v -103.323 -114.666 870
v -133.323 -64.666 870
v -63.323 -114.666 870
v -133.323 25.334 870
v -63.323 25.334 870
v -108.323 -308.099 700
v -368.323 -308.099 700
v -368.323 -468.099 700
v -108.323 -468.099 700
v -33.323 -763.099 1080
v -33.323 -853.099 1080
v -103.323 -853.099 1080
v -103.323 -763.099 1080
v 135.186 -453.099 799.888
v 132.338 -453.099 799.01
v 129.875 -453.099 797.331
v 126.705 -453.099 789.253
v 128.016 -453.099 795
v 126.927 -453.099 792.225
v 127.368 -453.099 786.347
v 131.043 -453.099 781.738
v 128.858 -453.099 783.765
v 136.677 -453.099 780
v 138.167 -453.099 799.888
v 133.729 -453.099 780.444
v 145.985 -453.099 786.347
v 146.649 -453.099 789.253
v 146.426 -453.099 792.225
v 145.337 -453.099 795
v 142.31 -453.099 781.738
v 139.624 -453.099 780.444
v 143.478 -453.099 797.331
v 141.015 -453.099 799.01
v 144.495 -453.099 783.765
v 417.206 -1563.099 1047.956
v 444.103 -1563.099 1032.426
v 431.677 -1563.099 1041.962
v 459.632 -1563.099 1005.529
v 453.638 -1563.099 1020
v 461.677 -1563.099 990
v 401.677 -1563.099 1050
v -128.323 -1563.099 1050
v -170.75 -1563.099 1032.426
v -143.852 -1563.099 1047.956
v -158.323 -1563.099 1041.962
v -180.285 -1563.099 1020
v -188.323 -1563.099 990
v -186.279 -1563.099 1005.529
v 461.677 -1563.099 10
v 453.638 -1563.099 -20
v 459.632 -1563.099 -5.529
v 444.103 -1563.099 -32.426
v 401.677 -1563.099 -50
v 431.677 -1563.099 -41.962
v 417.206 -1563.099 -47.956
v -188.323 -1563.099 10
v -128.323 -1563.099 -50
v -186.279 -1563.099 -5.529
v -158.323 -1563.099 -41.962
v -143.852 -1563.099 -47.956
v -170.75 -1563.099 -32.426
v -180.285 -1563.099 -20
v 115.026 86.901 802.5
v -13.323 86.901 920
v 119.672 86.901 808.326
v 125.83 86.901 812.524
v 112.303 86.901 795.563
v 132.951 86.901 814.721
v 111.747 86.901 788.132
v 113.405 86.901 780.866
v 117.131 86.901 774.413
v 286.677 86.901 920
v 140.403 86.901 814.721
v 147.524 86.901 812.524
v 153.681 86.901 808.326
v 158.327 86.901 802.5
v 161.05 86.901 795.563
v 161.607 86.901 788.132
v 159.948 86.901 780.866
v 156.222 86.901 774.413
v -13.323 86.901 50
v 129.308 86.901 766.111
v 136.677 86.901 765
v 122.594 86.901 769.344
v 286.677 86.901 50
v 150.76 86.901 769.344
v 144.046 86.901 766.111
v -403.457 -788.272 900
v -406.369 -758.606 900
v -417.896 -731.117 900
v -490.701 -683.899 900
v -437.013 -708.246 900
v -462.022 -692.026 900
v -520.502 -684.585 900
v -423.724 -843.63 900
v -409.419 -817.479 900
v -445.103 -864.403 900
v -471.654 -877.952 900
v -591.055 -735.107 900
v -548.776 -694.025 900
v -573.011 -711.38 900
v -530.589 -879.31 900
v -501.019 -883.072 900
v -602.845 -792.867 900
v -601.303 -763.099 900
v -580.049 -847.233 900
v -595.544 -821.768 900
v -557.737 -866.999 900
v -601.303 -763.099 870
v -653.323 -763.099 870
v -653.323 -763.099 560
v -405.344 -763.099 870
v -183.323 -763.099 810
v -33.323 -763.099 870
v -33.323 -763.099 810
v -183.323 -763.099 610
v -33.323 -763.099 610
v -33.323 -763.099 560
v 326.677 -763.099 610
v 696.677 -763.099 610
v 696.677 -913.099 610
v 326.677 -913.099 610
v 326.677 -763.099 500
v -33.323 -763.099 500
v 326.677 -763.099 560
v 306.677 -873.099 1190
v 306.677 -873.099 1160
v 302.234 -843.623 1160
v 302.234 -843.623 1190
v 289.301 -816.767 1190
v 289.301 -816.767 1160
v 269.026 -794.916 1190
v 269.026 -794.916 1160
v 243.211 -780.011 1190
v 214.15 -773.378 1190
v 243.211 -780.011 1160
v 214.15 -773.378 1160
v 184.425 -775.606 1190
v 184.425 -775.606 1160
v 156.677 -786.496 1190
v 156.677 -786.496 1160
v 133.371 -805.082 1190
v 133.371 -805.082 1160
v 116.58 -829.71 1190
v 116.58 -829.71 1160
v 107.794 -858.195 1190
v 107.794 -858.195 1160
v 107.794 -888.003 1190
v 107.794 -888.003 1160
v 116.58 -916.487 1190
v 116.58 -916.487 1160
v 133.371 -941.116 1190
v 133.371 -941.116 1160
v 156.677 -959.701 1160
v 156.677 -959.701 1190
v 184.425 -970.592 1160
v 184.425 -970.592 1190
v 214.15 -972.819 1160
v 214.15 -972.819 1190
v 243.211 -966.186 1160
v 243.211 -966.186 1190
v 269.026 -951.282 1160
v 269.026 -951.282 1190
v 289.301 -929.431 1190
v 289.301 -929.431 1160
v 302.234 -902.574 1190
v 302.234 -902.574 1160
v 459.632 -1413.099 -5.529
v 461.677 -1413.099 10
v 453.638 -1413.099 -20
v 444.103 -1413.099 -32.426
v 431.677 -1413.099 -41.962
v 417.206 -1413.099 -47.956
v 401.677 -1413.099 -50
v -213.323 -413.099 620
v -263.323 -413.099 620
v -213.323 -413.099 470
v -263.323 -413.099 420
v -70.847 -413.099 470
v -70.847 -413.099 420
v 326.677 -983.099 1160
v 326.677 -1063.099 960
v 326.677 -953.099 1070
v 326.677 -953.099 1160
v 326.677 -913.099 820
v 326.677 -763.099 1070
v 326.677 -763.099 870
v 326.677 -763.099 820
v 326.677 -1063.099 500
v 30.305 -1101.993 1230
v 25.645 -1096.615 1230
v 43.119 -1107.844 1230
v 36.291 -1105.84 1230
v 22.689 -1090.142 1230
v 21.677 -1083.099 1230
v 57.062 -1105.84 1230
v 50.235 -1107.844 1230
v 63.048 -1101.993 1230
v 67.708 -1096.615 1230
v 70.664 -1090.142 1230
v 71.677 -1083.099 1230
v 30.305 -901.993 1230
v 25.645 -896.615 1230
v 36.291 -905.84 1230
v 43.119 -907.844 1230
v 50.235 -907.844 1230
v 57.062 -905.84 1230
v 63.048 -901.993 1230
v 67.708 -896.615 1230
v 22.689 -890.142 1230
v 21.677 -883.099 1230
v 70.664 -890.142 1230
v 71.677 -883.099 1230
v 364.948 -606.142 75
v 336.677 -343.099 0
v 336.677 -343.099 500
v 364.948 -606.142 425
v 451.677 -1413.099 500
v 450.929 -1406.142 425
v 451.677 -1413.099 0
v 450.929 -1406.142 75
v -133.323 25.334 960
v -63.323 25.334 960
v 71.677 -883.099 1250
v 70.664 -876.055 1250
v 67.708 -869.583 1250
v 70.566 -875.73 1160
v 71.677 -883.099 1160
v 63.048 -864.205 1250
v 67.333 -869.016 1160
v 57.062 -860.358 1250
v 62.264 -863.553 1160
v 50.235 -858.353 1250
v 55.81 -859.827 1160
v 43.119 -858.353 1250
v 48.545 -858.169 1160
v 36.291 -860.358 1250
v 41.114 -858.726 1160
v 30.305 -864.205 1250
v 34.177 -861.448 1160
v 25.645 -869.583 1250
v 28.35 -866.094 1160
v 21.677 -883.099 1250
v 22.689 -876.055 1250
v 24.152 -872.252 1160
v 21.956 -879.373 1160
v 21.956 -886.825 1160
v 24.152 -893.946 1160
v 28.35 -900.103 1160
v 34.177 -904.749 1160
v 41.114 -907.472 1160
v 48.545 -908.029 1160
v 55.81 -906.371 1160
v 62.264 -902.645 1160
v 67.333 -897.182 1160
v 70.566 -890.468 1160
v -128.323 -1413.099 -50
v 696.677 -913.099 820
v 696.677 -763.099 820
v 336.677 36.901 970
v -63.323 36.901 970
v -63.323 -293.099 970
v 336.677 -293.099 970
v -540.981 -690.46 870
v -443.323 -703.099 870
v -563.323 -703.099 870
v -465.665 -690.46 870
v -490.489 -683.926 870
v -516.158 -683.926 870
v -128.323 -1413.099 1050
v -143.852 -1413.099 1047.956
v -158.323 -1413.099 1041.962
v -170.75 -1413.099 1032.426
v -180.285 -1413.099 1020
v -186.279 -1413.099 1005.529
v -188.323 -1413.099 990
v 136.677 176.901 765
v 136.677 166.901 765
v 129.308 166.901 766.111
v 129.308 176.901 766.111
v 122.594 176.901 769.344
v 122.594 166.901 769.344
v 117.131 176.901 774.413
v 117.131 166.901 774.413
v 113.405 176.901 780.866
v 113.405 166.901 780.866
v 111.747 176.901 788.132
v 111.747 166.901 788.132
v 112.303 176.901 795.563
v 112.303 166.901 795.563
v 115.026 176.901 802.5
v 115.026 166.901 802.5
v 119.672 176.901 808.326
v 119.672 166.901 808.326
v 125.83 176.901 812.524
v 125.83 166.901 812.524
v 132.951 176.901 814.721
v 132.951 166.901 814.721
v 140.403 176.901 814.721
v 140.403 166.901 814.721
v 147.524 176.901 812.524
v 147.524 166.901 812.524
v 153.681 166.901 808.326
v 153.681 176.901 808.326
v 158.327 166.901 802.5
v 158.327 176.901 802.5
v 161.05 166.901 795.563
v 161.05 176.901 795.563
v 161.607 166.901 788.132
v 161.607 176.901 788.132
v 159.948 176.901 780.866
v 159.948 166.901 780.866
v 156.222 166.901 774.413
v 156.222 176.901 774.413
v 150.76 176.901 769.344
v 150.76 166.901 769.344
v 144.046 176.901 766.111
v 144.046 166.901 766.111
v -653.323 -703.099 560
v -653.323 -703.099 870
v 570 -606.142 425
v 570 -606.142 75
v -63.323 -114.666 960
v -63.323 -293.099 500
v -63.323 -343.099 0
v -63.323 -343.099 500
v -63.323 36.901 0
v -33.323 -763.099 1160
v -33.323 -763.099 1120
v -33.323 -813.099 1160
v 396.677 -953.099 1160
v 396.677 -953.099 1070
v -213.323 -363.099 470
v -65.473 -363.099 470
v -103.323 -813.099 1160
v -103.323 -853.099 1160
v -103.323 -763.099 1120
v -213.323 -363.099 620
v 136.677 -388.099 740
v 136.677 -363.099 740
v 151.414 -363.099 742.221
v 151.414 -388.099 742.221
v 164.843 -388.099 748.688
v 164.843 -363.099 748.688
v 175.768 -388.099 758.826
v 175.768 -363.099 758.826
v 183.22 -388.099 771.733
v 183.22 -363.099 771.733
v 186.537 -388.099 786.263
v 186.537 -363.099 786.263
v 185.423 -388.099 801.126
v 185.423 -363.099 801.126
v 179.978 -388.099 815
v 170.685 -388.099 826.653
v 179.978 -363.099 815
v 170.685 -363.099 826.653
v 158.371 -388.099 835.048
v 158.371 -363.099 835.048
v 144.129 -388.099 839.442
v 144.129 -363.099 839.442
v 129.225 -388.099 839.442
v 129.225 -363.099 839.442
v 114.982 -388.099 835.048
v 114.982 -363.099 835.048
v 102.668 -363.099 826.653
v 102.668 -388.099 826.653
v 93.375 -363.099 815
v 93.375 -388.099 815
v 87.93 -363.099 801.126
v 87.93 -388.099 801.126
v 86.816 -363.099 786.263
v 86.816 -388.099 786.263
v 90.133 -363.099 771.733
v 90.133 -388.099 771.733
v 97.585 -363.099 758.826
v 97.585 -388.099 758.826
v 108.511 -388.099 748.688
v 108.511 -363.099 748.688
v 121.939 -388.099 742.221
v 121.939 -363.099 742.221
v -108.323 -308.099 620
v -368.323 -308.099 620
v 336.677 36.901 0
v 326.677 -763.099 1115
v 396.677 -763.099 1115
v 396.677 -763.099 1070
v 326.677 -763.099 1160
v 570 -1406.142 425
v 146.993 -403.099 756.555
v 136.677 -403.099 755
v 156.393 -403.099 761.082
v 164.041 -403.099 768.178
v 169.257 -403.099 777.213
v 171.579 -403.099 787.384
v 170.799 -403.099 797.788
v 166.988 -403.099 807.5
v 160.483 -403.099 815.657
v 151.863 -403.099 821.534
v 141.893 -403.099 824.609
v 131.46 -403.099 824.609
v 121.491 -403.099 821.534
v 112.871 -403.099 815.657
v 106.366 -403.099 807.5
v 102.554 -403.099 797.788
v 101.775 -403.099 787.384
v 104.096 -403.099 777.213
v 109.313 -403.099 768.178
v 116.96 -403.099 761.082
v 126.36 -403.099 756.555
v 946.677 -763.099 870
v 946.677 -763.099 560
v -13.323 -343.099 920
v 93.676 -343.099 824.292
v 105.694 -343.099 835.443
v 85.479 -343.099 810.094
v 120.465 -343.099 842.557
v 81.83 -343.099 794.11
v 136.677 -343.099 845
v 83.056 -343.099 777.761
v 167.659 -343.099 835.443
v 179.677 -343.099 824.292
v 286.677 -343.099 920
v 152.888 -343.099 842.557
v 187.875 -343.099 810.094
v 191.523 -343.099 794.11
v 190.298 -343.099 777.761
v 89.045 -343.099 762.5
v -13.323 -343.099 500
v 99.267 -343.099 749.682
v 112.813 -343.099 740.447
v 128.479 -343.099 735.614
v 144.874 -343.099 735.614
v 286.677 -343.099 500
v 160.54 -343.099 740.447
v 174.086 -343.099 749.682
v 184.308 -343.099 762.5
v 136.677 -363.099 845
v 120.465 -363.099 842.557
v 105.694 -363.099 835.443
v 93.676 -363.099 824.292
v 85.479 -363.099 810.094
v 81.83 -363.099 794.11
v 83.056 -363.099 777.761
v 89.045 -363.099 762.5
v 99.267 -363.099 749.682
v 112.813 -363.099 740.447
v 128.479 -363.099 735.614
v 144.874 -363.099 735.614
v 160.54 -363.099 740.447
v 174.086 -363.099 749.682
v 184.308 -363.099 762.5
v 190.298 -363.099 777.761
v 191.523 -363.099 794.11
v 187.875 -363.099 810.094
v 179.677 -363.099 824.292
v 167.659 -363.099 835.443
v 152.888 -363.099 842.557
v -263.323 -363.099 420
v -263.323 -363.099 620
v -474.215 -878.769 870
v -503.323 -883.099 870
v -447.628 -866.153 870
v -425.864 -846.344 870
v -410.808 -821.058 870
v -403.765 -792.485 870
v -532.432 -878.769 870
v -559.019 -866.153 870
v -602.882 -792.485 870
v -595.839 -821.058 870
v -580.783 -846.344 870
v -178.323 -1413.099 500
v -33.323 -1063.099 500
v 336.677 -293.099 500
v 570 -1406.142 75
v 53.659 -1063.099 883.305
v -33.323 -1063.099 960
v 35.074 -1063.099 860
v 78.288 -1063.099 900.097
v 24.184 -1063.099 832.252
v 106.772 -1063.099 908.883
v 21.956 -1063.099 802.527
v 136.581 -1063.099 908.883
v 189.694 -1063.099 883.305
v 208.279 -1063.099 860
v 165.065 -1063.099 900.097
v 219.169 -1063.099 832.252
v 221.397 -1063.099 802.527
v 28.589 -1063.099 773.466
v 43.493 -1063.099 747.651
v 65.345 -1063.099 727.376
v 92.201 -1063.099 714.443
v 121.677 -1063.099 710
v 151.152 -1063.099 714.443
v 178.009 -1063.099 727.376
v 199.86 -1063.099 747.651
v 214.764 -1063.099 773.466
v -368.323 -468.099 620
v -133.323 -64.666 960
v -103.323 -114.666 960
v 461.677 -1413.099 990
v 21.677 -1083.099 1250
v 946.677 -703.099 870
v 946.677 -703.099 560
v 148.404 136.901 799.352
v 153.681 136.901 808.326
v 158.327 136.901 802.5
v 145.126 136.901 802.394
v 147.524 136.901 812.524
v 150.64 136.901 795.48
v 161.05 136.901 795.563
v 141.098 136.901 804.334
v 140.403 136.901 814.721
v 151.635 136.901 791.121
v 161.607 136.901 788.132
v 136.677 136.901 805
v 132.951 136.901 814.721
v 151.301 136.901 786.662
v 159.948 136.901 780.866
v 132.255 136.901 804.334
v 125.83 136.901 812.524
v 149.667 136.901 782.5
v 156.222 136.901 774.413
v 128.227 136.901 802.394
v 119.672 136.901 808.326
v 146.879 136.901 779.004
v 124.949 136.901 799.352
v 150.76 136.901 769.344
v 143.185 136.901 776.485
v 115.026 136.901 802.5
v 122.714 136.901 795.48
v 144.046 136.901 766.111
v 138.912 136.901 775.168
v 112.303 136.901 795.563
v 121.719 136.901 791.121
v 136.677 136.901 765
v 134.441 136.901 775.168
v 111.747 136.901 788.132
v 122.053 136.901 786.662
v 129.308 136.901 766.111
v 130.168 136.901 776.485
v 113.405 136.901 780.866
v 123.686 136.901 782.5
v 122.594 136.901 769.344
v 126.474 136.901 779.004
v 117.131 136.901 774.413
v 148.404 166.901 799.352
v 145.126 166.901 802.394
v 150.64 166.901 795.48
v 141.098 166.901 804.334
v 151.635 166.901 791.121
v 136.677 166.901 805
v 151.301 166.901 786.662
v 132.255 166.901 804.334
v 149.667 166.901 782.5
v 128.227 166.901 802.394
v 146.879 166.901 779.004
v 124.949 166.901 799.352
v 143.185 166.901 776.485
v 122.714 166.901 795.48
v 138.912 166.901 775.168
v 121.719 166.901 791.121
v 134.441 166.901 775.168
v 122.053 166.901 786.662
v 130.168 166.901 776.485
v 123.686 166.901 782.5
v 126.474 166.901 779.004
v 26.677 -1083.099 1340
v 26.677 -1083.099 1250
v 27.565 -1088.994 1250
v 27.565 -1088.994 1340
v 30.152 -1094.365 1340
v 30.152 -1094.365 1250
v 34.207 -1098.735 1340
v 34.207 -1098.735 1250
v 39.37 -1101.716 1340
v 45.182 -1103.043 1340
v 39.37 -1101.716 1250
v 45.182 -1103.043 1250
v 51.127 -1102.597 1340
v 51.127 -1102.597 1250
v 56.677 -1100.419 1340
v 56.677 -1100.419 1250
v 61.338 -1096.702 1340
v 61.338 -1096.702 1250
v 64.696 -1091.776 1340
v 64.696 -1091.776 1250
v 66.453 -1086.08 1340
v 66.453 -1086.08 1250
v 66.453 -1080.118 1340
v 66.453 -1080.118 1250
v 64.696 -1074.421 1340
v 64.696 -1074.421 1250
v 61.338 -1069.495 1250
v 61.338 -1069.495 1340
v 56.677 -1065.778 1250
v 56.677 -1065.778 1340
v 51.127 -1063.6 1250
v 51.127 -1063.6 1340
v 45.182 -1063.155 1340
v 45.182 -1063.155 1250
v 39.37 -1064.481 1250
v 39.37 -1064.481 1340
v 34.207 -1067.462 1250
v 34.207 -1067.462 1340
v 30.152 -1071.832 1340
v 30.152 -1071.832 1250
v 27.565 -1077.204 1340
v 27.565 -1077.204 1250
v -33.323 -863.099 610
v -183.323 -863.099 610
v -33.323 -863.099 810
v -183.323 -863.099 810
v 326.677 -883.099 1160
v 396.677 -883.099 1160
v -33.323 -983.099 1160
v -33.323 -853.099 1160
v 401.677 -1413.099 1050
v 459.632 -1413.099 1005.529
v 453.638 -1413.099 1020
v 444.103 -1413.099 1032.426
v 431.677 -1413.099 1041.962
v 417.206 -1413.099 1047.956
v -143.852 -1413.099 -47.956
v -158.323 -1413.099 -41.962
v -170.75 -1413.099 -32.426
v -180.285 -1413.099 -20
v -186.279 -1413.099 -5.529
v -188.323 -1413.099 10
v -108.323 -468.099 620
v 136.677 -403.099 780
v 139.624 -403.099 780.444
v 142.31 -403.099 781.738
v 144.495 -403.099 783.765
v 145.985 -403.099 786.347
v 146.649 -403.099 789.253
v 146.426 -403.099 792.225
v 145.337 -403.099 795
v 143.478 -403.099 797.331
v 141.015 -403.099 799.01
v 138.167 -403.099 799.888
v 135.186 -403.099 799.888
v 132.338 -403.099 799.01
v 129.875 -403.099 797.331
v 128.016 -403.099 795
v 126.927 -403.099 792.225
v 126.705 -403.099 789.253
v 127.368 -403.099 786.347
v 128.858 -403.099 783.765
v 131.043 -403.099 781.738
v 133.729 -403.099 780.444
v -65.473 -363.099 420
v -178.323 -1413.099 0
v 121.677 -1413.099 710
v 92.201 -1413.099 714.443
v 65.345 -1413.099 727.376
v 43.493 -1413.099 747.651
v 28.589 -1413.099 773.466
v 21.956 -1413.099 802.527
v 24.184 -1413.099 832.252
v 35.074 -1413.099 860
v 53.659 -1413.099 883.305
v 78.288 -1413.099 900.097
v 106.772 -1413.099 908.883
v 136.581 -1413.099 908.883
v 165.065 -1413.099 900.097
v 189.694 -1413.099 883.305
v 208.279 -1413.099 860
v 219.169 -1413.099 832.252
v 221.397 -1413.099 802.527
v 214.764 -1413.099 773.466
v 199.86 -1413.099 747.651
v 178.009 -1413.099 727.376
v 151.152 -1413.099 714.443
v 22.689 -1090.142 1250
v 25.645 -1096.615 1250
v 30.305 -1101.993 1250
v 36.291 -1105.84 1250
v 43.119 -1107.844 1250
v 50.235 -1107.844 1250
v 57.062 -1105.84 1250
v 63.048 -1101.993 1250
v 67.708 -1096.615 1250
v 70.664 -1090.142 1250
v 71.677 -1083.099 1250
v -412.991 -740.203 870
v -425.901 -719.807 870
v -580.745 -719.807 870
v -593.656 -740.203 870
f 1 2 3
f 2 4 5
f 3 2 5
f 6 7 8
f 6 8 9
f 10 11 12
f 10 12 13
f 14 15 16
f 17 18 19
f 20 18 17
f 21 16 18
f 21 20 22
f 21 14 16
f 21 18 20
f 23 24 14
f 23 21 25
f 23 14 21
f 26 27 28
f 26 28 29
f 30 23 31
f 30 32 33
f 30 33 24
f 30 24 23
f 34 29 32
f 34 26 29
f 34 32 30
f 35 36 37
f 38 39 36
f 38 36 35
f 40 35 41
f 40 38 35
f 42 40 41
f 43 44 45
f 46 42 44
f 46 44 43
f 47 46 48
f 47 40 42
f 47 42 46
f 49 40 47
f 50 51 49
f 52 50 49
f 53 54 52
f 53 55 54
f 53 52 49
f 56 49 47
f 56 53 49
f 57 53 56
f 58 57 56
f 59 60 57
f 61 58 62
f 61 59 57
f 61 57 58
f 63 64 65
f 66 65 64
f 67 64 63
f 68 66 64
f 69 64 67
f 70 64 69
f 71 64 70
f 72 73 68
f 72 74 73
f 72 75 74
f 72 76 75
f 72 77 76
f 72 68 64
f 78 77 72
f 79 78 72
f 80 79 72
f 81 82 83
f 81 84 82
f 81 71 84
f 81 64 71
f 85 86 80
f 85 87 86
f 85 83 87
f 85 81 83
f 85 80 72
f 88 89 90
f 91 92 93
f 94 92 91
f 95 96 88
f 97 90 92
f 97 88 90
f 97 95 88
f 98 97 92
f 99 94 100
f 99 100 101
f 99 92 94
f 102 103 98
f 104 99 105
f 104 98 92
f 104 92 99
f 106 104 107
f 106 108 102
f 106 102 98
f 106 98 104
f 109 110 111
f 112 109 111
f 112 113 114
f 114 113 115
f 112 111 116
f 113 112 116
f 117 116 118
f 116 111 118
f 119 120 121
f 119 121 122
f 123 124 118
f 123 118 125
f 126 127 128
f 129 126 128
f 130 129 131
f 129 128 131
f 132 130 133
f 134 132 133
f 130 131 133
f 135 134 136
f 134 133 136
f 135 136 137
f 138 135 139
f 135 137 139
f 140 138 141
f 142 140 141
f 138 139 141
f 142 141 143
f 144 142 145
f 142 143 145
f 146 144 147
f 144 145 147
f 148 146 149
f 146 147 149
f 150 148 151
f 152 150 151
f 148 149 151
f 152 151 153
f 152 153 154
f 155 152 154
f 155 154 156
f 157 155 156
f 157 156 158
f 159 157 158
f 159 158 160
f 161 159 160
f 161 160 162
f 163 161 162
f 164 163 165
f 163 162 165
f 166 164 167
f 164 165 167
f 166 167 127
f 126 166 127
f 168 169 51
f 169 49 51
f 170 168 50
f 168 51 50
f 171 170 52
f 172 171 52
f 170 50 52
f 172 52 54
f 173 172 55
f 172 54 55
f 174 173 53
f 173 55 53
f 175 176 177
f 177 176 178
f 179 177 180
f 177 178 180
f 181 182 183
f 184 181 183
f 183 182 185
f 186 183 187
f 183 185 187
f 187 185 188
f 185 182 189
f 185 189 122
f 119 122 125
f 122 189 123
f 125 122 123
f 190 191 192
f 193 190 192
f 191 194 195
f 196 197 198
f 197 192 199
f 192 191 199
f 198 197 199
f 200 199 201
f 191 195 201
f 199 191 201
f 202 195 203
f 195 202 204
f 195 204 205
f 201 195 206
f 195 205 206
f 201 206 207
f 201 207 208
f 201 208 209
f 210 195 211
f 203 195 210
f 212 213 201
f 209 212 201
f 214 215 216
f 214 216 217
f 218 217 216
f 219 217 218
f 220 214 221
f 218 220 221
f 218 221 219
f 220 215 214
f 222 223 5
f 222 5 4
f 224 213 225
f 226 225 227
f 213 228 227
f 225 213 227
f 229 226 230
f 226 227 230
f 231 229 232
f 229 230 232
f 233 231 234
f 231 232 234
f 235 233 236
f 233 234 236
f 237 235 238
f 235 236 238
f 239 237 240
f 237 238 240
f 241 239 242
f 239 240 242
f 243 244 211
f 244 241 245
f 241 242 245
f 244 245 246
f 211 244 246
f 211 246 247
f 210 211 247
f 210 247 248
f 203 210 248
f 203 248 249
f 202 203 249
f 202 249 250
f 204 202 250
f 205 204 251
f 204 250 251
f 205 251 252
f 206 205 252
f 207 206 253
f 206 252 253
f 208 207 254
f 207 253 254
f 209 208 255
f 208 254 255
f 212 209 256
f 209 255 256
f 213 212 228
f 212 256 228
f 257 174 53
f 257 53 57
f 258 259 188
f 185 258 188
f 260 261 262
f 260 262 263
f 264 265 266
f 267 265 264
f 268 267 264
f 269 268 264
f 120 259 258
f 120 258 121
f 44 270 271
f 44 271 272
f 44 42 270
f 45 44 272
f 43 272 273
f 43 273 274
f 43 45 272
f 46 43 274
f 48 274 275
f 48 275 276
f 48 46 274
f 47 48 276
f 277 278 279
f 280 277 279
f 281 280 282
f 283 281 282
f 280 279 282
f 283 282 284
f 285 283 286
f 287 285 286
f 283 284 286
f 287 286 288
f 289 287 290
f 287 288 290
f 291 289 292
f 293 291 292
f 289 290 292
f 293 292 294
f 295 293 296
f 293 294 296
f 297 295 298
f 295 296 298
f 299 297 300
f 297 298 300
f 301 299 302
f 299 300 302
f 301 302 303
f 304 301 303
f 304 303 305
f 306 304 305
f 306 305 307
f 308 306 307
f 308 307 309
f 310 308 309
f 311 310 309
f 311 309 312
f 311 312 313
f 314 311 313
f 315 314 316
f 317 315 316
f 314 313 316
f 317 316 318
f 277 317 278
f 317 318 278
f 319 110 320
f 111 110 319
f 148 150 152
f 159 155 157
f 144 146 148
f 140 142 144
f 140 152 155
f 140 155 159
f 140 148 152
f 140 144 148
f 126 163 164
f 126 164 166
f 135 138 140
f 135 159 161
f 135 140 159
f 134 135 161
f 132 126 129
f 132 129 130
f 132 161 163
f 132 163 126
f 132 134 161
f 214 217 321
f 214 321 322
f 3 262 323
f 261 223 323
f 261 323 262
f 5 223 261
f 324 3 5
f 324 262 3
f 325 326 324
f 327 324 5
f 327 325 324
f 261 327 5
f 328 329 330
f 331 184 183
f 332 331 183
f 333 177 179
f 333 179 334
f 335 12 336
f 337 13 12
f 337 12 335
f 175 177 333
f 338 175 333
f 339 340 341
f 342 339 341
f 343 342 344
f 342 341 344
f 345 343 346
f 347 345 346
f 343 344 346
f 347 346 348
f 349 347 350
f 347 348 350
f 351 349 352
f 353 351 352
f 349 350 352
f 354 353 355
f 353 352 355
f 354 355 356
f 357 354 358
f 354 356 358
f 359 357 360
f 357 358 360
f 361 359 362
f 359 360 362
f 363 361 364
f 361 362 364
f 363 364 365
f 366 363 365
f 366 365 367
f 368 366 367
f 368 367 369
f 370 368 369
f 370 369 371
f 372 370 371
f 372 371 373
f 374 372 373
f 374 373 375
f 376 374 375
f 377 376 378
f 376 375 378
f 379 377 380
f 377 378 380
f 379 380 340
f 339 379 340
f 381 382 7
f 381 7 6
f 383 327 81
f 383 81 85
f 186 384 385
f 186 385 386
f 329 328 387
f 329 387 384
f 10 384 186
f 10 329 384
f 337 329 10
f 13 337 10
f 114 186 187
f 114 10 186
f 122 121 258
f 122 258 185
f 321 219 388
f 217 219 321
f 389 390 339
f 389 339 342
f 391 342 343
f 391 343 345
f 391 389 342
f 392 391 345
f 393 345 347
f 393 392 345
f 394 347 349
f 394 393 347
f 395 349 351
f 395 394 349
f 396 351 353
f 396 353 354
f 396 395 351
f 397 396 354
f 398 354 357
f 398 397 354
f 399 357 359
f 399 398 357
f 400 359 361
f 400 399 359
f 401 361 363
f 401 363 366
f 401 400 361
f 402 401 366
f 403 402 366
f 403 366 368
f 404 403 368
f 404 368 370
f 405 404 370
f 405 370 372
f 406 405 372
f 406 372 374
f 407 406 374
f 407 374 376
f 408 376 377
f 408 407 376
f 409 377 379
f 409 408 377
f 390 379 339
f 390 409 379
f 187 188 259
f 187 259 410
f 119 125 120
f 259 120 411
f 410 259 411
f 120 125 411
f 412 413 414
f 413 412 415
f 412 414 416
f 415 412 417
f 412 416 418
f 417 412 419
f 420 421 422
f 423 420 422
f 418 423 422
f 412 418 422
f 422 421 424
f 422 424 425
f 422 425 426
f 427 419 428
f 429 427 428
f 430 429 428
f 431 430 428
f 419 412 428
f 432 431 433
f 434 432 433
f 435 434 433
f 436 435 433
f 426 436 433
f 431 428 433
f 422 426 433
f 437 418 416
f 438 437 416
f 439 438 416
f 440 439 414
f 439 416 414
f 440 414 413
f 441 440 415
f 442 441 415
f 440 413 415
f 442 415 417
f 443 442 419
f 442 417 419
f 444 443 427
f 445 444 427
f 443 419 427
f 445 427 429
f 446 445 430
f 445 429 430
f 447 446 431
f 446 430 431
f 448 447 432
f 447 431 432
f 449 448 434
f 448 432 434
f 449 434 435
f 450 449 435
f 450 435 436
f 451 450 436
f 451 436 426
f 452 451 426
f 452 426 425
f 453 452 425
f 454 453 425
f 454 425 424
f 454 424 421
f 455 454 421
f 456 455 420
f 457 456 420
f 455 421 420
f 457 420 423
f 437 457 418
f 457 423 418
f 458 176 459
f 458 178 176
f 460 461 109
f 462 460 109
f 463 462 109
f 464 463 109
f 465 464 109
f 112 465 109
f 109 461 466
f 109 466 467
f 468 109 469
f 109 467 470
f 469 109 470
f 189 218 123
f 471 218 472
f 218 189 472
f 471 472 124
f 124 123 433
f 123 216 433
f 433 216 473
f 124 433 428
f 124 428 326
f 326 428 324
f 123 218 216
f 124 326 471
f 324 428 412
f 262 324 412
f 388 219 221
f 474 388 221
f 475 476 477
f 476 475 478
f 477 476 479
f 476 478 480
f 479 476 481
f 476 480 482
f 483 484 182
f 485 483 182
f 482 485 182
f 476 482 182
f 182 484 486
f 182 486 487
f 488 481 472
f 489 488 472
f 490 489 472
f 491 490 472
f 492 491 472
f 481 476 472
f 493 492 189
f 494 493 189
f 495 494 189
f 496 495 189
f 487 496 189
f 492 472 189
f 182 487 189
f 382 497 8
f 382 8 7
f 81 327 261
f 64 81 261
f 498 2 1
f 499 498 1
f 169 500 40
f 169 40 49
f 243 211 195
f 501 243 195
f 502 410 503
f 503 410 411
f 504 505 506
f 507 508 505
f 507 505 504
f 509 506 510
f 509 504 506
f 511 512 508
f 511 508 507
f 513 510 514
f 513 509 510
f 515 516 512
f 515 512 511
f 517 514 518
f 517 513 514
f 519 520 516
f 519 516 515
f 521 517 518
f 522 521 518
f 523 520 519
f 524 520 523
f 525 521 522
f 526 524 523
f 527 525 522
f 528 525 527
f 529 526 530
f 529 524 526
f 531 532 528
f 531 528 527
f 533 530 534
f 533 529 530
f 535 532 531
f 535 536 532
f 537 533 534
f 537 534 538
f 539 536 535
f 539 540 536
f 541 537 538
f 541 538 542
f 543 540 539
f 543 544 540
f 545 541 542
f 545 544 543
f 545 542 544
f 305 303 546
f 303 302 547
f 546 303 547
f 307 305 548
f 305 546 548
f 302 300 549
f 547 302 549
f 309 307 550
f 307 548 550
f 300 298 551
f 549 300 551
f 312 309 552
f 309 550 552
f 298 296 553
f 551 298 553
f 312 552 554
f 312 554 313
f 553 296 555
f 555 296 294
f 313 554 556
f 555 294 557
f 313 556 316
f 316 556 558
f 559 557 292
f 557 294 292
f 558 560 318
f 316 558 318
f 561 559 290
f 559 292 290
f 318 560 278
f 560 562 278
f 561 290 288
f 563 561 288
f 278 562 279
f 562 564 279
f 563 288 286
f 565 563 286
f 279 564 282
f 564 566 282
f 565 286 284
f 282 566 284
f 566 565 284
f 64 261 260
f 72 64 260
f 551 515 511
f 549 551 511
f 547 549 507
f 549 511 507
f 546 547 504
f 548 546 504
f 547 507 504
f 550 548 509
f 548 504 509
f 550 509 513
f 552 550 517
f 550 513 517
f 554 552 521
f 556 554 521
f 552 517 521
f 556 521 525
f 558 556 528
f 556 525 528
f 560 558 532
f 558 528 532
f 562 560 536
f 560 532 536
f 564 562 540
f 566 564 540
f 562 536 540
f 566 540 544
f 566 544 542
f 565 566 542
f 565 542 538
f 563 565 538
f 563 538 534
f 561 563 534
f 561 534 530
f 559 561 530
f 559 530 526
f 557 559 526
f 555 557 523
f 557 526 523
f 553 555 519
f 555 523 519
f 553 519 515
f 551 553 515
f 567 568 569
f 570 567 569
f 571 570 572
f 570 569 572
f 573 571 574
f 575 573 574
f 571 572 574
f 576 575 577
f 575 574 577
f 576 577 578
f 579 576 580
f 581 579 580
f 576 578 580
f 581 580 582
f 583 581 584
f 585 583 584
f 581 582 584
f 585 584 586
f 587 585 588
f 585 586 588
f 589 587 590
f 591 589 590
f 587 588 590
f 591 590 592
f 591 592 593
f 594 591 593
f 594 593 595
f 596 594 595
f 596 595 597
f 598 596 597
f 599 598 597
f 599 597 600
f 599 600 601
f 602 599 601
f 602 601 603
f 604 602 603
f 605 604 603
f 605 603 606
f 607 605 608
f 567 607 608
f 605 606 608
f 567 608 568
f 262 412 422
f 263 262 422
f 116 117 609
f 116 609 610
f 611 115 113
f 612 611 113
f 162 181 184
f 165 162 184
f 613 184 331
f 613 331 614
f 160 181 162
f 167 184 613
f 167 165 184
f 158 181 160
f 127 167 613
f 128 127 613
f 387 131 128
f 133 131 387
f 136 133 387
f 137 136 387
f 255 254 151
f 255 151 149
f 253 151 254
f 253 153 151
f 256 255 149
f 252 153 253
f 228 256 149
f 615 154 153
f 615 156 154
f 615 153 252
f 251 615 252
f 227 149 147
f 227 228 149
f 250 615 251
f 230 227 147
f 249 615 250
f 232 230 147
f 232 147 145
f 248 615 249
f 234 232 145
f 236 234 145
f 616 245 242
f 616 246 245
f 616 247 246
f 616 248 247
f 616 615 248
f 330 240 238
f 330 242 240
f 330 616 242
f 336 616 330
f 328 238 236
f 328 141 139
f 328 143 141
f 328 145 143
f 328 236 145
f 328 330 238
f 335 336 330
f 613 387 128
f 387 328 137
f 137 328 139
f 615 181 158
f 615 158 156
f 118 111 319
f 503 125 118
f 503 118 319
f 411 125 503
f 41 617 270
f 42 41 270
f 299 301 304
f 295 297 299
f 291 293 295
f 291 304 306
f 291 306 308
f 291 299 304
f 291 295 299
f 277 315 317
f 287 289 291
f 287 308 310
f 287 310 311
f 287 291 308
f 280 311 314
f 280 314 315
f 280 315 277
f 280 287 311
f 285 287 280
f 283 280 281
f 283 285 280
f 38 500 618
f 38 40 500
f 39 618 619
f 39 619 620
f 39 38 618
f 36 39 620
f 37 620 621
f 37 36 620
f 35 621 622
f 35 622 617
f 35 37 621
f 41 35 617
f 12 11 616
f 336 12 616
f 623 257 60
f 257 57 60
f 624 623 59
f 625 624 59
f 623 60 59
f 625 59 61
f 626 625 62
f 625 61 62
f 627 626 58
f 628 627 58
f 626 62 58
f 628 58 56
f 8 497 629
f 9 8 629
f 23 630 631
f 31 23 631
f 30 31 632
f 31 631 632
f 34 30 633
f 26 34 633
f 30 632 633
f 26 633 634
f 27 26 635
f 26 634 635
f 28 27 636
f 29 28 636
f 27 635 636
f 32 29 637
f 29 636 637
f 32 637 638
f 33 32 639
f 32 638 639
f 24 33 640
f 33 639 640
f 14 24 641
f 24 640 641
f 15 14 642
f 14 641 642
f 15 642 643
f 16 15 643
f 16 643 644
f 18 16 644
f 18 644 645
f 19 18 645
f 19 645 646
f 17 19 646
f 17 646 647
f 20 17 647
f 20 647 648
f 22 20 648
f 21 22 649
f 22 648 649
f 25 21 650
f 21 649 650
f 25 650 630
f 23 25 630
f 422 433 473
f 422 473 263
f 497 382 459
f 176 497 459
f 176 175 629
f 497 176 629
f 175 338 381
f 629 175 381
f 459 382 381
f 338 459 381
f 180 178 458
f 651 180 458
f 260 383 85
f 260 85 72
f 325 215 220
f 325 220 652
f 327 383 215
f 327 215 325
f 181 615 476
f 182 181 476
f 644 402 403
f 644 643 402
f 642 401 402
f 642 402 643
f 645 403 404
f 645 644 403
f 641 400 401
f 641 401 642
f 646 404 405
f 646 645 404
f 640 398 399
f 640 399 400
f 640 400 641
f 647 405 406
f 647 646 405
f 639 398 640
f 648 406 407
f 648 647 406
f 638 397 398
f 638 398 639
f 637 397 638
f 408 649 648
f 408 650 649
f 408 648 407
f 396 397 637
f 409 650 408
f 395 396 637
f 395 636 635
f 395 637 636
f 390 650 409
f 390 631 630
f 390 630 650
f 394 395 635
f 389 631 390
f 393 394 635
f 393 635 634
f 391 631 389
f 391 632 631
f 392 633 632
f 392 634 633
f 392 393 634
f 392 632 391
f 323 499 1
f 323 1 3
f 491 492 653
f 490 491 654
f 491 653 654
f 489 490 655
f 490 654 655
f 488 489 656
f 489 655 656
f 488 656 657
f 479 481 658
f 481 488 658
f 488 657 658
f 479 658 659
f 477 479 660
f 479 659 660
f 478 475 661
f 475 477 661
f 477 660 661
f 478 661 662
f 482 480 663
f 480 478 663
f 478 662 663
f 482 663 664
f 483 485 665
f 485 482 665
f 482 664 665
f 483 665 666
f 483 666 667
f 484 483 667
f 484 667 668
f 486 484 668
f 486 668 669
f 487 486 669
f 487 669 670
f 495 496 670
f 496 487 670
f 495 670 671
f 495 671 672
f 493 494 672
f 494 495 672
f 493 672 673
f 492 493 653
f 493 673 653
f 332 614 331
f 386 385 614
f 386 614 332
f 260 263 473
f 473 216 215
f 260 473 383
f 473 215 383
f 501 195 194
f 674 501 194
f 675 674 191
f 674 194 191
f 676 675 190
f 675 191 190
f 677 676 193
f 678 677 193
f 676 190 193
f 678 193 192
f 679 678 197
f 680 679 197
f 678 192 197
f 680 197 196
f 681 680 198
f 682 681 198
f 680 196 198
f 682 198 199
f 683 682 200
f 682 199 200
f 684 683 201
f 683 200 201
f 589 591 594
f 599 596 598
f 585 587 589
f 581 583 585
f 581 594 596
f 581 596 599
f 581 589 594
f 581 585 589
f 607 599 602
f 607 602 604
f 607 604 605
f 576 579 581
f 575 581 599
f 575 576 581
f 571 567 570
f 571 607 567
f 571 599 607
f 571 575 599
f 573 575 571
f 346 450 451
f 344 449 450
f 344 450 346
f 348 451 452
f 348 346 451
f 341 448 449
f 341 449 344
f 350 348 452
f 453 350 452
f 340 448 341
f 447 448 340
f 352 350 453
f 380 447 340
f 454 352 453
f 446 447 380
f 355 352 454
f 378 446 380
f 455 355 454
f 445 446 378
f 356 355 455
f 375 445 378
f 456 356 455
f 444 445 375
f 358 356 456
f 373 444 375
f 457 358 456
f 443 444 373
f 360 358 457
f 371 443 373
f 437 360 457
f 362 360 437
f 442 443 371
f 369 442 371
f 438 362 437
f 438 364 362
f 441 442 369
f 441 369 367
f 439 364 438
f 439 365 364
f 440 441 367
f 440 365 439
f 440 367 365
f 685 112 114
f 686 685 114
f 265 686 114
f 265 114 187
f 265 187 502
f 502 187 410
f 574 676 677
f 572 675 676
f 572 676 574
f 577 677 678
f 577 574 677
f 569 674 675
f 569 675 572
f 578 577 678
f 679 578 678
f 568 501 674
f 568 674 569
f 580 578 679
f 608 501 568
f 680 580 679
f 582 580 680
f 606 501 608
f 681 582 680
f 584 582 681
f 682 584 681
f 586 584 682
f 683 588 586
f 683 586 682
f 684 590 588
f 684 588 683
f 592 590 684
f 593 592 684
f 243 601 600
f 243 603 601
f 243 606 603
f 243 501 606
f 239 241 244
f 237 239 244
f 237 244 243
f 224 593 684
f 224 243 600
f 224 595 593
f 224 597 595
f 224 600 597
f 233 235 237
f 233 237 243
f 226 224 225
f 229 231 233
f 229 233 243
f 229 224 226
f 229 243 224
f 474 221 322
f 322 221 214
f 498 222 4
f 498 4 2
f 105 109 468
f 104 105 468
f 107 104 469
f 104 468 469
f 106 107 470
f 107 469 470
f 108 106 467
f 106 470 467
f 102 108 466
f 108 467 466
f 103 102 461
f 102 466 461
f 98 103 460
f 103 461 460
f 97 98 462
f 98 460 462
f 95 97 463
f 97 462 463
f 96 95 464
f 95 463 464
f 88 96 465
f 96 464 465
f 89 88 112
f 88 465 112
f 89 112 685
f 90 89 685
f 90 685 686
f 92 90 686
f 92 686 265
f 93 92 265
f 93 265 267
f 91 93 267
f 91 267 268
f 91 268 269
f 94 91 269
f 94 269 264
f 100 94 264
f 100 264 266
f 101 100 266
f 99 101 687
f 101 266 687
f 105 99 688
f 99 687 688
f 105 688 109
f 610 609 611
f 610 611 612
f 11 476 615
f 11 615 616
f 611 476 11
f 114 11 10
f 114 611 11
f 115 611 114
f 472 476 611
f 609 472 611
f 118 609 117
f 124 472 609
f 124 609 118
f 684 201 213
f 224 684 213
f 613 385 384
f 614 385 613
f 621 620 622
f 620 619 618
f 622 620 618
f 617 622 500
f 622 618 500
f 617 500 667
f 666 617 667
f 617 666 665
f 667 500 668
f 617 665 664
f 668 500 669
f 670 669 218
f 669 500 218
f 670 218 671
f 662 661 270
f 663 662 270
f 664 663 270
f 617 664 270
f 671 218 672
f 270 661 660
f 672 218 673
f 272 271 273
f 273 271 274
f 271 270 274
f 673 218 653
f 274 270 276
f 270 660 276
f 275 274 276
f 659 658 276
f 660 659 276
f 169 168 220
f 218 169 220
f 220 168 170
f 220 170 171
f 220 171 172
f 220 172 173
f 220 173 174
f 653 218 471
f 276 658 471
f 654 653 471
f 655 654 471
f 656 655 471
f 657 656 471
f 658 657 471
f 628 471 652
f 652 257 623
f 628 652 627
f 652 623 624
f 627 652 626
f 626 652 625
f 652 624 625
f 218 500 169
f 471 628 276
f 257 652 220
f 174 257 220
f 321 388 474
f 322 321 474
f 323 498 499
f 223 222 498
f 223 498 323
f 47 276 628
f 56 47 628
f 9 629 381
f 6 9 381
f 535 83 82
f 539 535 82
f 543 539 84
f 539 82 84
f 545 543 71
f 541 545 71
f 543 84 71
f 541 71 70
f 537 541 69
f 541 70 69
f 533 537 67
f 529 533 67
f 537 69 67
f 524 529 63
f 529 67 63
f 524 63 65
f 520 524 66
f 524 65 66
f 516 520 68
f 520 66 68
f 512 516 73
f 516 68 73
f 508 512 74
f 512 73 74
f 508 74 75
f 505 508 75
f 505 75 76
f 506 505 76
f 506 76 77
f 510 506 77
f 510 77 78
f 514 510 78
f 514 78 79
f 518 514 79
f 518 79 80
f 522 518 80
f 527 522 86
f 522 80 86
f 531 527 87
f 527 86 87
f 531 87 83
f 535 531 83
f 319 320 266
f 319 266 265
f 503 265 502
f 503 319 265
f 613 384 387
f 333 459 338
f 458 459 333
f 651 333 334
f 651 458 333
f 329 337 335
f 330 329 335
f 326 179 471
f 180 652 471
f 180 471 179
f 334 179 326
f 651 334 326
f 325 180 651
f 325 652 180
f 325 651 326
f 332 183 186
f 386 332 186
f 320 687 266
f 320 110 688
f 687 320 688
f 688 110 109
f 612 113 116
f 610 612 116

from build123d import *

# Parameters (mm, degrees)
SKETCH_2_W          = 400
SKETCH_2_H          = 430
EXTRUDE_2_DEPTH     = 970
EXTRUDE_3_DEPTH     = 500
SKETCH_4_W          = 650
SKETCH_4_H          = 1100
EXTRUDE_4_DEPTH     = 150
SKETCH_5_R          = 25
EXTRUDE_5_DEPTH     = 50
SKETCH_6_R          = 15
EXTRUDE_6_DEPTH     = 30
SKETCH_7_R          = 25
EXTRUDE_7_DEPTH     = 10
CHAMFER_1_SIZE      = 50
SKETCH_8_R          = 55
EXTRUDE_8_DEPTH     = 20
SKETCH_9_R          = 50
EXTRUDE_9_DEPTH     = 40
CHAMFER_2_SIZE      = 15
SKETCH_10_R         = 10
EXTRUDE_10_DEPTH    = 50
SKETCH_11_W         = 360
SKETCH_11_H         = 300
EXTRUDE_11_DEPTH    = 660
SKETCH_12_W         = 1600
SKETCH_12_H         = 310
EXTRUDE_12_DEPTH    = 60
SKETCH_13_W         = 350
SKETCH_13_H         = 800
EXTRUDE_13_DEPTH    = 570
SKETCH_14_R         = 100
EXTRUDE_14_DEPTH    = 400
EXTRUDE_15_DEPTH    = 100
CUT_EXTRUDE_1_DEPTH = 10
SKETCH_17_R         = 100
EXTRUDE_16_DEPTH    = 30
CUT_EXTRUDE_2_REACH = 2181.284
SKETCH_19_W         = 370
SKETCH_19_H         = 210
EXTRUDE_17_DEPTH    = 150
SKETCH_20_W         = 150
SKETCH_20_H         = 200
EXTRUDE_18_DEPTH    = 100
SKETCH_21_R         = 25
EXTRUDE_19_DEPTH    = 70
SKETCH_22_R         = 100
EXTRUDE_20_DEPTH    = 30
EXTRUDE_21_DEPTH    = 20
SKETCH_24_R         = 20
EXTRUDE_22_DEPTH    = 90
SKETCH_25_W         = 80
SKETCH_25_H         = 90
EXTRUDE_23_DEPTH    = 70
CUT_EXTRUDE_3_DEPTH = 70
SKETCH_27_W         = 90
SKETCH_27_H         = 190
EXTRUDE_24_DEPTH    = 70
CUT_EXTRUDE_4_DEPTH = 70
FILLET_1_R          = 60
SKETCH_29_W         = 50
SKETCH_29_H         = 50
EXTRUDE_25_DEPTH    = 200
SKETCH_30_W         = 50
SKETCH_30_H         = 50
EXTRUDE_26_DEPTH    = 150
SKETCH_31_W         = 260
SKETCH_31_H         = 160
EXTRUDE_27_DEPTH    = 80


with BuildPart() as part:
    # ｽｹｯﾁ2 → ﾎﾞｽ - 押し出し2 (new body)
    with BuildSketch(Plane.XY):
        with Locations((136.676642933, -128.098797217)):
            Rectangle(SKETCH_2_W, SKETCH_2_H)
    extrude(amount=EXTRUDE_2_DEPTH)

    # ｽｹｯﾁ3 → ﾎﾞｽ - 押し出し3 (add)
    with BuildSketch(Plane(origin=(0, 0, 0), x_dir=(-1, 0, 0), z_dir=(0, 0, -1))):
        Polygon((-451.676642933, -1413.098797217), (178.323357067, -1413.098797217), (63.323357067, -343.098797217), (-336.676642933, -343.098797217), align=None)
    extrude(amount=-EXTRUDE_3_DEPTH)

    # ｽｹｯﾁ4 → ﾎﾞｽ - 押し出し4 (add)
    with BuildSketch(Plane(origin=(0, -1413.098797217, 0), x_dir=(-1, 0, 0), z_dir=(0, -1, 0))):
        with Locations((-136.676642933, -500)):
            Rectangle(SKETCH_4_W, SKETCH_4_H)
    extrude(amount=EXTRUDE_4_DEPTH)

    # ｽｹｯﾁ5 → ﾎﾞｽ - 押し出し5 (add)
    with BuildSketch(Plane(origin=(0, 86.901202783, 0), x_dir=(1, 0, 0), z_dir=(0, 1, 0))):
        with Locations(Location((136.676642933, -790, 0), (0, 0, 90))):
            Circle(SKETCH_5_R)
    extrude(amount=EXTRUDE_5_DEPTH)

    # ｽｹｯﾁ6 → ﾎﾞｽ - 押し出し6 (add)
    with BuildSketch(Plane(origin=(0, 136.901202783, 0), x_dir=(1, 0, 0), z_dir=(0, 1, 0))):
        with Locations(Location((136.676642933, -790, 0), (0, 0, 270))):
            Circle(SKETCH_6_R)
    extrude(amount=EXTRUDE_6_DEPTH)

    # ｽｹｯﾁ7 → ﾎﾞｽ - 押し出し7 (add)
    with BuildSketch(Plane(origin=(0, 166.901202783, 0), x_dir=(1, 0, 0), z_dir=(0, 1, 0))):
        with Locations(Location((136.676642933, -790, 0), (0, 0, 90))):
            Circle(SKETCH_7_R)
    extrude(amount=EXTRUDE_7_DEPTH)

    # 面取り1
    chamfer_1_edges = [part.edges().sort_by_distance(p)[0] for p in [
        (-63.323357067, 86.901202783, 485),
        (136.676642933, 86.901202783, 0),
        (136.676642933, 86.901202783, 970),
        (336.676642933, 86.901202783, 485),
        (-63.323357067, -343.098797217, 735),
        (336.676642933, -343.098797217, 735),
        (136.676642933, -343.098797217, 970),
    ]]
    chamfer(chamfer_1_edges, length=CHAMFER_1_SIZE)

    # ｽｹｯﾁ8 → ﾎﾞｽ - 押し出し8 (add)
    with BuildSketch(Plane(origin=(0, -343.098797217, 0), x_dir=(-1, 0, 0), z_dir=(0, -1, 0))):
        with Locations(Location((-136.676642933, -790, 0), (0, 0, 270))):
            Circle(SKETCH_8_R)
    extrude(amount=EXTRUDE_8_DEPTH)

    # ｽｹｯﾁ9 → ﾎﾞｽ - 押し出し9 (add)
    with BuildSketch(Plane(origin=(0, -363.098797217, 0), x_dir=(-1, 0, 0), z_dir=(0, -1, 0))):
        with Locations(Location((-136.676642933, -790, 0), (0, 0, 90))):
            Circle(SKETCH_9_R)
    extrude(amount=EXTRUDE_9_DEPTH)

    # 面取り2
    chamfer_2_edges = [part.edges().sort_by_distance(p)[0] for p in [
        (136.676642933, -403.098797217, 840),
    ]]
    chamfer(chamfer_2_edges, length=CHAMFER_2_SIZE)

    # ｽｹｯﾁ10 → ﾎﾞｽ - 押し出し10 (add)
    with BuildSketch(Plane(origin=(0, -403.098797217, 0), x_dir=(-1, 0, 0), z_dir=(0, -1, 0))):
        with Locations(Location((-136.676642933, -790, 0), (0, 0, 90))):
            Circle(SKETCH_10_R)
    extrude(amount=EXTRUDE_10_DEPTH)

    # ｽｹｯﾁ11 → ﾎﾞｽ - 押し出し11 (add)
    with BuildSketch(Plane.XY.offset(500)):
        with Locations((146.676642933, -913.098797217)):
            Rectangle(SKETCH_11_W, SKETCH_11_H)
    extrude(amount=EXTRUDE_11_DEPTH)

    # ｽｹｯﾁ12 → ﾎﾞｽ - 押し出し12 (add)
    with BuildSketch(Plane(origin=(0, -763.098797217, 0), x_dir=(1, 0, 0), z_dir=(0, 1, 0))):
        with Locations((146.676642933, -715)):
            Rectangle(SKETCH_12_W, SKETCH_12_H)
    extrude(amount=EXTRUDE_12_DEPTH)

    # ｽｹｯﾁ13 → ﾎﾞｽ - 押し出し13 (add)
    with BuildSketch(Plane(origin=(0, 0, 0), x_dir=(0, 0, -1), z_dir=(1, 0, 0))):
        with Locations((-250, -1006.142275478)):
            Rectangle(SKETCH_13_W, SKETCH_13_H)
    extrude(amount=EXTRUDE_13_DEPTH)

    # ｽｹｯﾁ14 → ﾎﾞｽ - 押し出し14 (add)
    with BuildSketch(Plane(origin=(0, -1413.098797217, 0), x_dir=(1, 0, 0), z_dir=(0, 1, 0))):
        with Locations(Location((121.676642933, -810, 0), (0, 0, 90))):
            Circle(SKETCH_14_R)
    extrude(amount=EXTRUDE_14_DEPTH)

    # ｽｹｯﾁ15 → ﾎﾞｽ - 押し出し15 (add)
    with BuildSketch(Plane.XY.offset(970)):
        Polygon((-63.323357067, 25.333856753), (-133.323357067, 25.333856753), (-133.323357067, -64.666143247), (-103.323357067, -114.666143247), (-63.323357067, -114.666143247), align=None)
    extrude(amount=-EXTRUDE_15_DEPTH)

    # ｽｹｯﾁ16 → ｶｯﾄ - 押し出し1 (cut)
    with BuildSketch(Plane.XY.offset(970)):
        Polygon((-63.323357067, 25.333856753), (-133.323357067, 25.333856753), (-133.323357067, -64.666143247), (-103.323357067, -114.666143247), (-63.323357067, -114.666143247), align=None)
    extrude(amount=-CUT_EXTRUDE_1_DEPTH, mode=Mode.SUBTRACT)

    # ｽｹｯﾁ17 → ﾎﾞｽ - 押し出し16 (add)
    with BuildSketch(Plane.XY.offset(870)):
        with Locations(Location((-503.323357067, -783.098797217, 0), (0, 0, 168.463040967))):
            Circle(SKETCH_17_R)
    extrude(amount=EXTRUDE_16_DEPTH)

    # ｽｹｯﾁ18 → ｶｯﾄ - 押し出し2 (cut, up to next)
    with BuildSketch(Plane.ZY.offset(33.323357067), mode=Mode.PRIVATE) as cut_extrude_2_sk1:
        Polygon((1160, -1063.098797217), (1160, -983.098797217), (960, -1063.098797217), align=None)
    cut_extrude_2_tool1 = extrude(cut_extrude_2_sk1.sketch, amount=-CUT_EXTRUDE_2_REACH, mode=Mode.PRIVATE) & part.part
    add(cut_extrude_2_tool1.solids().sort_by_distance((-33.323357, -1036.432131, 1093.333333))[0], mode=Mode.SUBTRACT)

    # ｽｹｯﾁ19 → ﾎﾞｽ - 押し出し17 (add)
    with BuildSketch(Plane(origin=(0, -763.098797217, 0), x_dir=(-1, 0, 0), z_dir=(0, -1, 0))):
        with Locations((-511.676642933, -715)):
            Rectangle(SKETCH_19_W, SKETCH_19_H)
    extrude(amount=EXTRUDE_17_DEPTH)

    # ｽｹｯﾁ20 → ﾎﾞｽ - 押し出し18 (add)
    with BuildSketch(Plane(origin=(0, -763.098797217, 0), x_dir=(-1, 0, 0), z_dir=(0, -1, 0))):
        with Locations((108.323357067, -710)):
            Rectangle(SKETCH_20_W, SKETCH_20_H)
    extrude(amount=EXTRUDE_18_DEPTH)

    # ｽｹｯﾁ21 → ﾎﾞｽ - 押し出し19 (add)
    with BuildSketch(Plane.XY.offset(1160)):
        with Locations((46.676642933, -883.098797217)):
            Circle(SKETCH_21_R)
    extrude(amount=EXTRUDE_19_DEPTH)

    # ｽｹｯﾁ22 → ﾎﾞｽ - 押し出し20 (add)
    with BuildSketch(Plane.XY.offset(1160)):
        with Locations((206.676642933, -873.098797217)):
            Circle(SKETCH_22_R)
    extrude(amount=EXTRUDE_20_DEPTH)

    # ｽｹｯﾁ23 → ﾎﾞｽ - 押し出し21 (add)
    with BuildSketch(Plane.XY.offset(1230)):
        with BuildLine():
            Line((21.676642933, -883.098797217), (21.676642933, -1083.098797217))
            ThreePointArc((21.676642933, -1083.098797217), (46.676642933, -1108.098797217), (71.676642933, -1083.098797217))
            Line((71.676642933, -1083.098797217), (71.676642933, -883.098797217))
            ThreePointArc((71.676642933, -883.098797217), (46.676642933, -858.098797217), (21.676642933, -883.098797217))
        make_face()
    extrude(amount=EXTRUDE_21_DEPTH)

    # ｽｹｯﾁ24 → ﾎﾞｽ - 押し出し22 (add)
    with BuildSketch(Plane.XY.offset(1250)):
        with Locations(Location((46.676642933, -1083.098797217, 0), (0, 0, 180))):
            Circle(SKETCH_24_R)
    extrude(amount=EXTRUDE_22_DEPTH)

    # ｽｹｯﾁ25 → ﾎﾞｽ - 押し出し23 (add)
    with BuildSketch(Plane.ZY.offset(33.323357067)):
        with Locations((1120, -808.098797217)):
            Rectangle(SKETCH_25_W, SKETCH_25_H)
    extrude(amount=EXTRUDE_23_DEPTH)

    # ｽｹｯﾁ26 → ｶｯﾄ - 押し出し3 (cut)
    with BuildSketch(Plane.ZY.offset(103.323357067)):
        Polygon((1160, -763.098797217), (1120, -763.098797217), (1160, -813.098797217), align=None)
    extrude(amount=-CUT_EXTRUDE_3_DEPTH, mode=Mode.SUBTRACT)

    # ｽｹｯﾁ27 → ﾎﾞｽ - 押し出し24 (add)
    with BuildSketch(Plane(origin=(326.676642933, 0, 0), x_dir=(0, 0, -1), z_dir=(1, 0, 0))):
        with Locations((-1115, -858.098797217)):
            Rectangle(SKETCH_27_W, SKETCH_27_H)
    extrude(amount=EXTRUDE_24_DEPTH)

    # ｽｹｯﾁ28 → ｶｯﾄ - 押し出し4 (cut)
    with BuildSketch(Plane(origin=(396.676642933, 0, 0), x_dir=(0, 0, -1), z_dir=(1, 0, 0))):
        Polygon((-1115, -763.098797217), (-1160, -883.098797217), (-1160, -763.098797217), align=None)
    extrude(amount=-CUT_EXTRUDE_4_DEPTH, mode=Mode.SUBTRACT)

    # ﾌｨﾚｯﾄ1
    fillet_1_edges = [part.edges().sort_by_distance(p)[0] for p in [
        (461.676642933, -1488.098797217, -50),
        (461.676642933, -1488.098797217, 1050),
        (-188.323357067, -1488.098797217, 1050),
        (-188.323357067, -1488.098797217, -50),
    ]]
    fillet(fillet_1_edges, radius=FILLET_1_R)

    # ｽｹｯﾁ29 → ﾎﾞｽ - 押し出し25 (add)
    with BuildSketch(Plane.ZY.offset(63.323357067)):
        with Locations((445, -388.098797217)):
            Rectangle(SKETCH_29_W, SKETCH_29_H)
    extrude(amount=EXTRUDE_25_DEPTH)

    # ｽｹｯﾁ30 → ﾎﾞｽ - 押し出し26 (add)
    with BuildSketch(Plane.XY.offset(470)):
        with Locations((-238.323357067, -388.098797217)):
            Rectangle(SKETCH_30_W, SKETCH_30_H)
    extrude(amount=EXTRUDE_26_DEPTH)

    # ｽｹｯﾁ31 → ﾎﾞｽ - 押し出し27 (add)
    with BuildSketch(Plane.XY.offset(620)):
        with Locations((-238.323357067, -388.098797217)):
            Rectangle(SKETCH_31_W, SKETCH_31_H)
    extrude(amount=EXTRUDE_27_DEPTH)


solid = part.part
